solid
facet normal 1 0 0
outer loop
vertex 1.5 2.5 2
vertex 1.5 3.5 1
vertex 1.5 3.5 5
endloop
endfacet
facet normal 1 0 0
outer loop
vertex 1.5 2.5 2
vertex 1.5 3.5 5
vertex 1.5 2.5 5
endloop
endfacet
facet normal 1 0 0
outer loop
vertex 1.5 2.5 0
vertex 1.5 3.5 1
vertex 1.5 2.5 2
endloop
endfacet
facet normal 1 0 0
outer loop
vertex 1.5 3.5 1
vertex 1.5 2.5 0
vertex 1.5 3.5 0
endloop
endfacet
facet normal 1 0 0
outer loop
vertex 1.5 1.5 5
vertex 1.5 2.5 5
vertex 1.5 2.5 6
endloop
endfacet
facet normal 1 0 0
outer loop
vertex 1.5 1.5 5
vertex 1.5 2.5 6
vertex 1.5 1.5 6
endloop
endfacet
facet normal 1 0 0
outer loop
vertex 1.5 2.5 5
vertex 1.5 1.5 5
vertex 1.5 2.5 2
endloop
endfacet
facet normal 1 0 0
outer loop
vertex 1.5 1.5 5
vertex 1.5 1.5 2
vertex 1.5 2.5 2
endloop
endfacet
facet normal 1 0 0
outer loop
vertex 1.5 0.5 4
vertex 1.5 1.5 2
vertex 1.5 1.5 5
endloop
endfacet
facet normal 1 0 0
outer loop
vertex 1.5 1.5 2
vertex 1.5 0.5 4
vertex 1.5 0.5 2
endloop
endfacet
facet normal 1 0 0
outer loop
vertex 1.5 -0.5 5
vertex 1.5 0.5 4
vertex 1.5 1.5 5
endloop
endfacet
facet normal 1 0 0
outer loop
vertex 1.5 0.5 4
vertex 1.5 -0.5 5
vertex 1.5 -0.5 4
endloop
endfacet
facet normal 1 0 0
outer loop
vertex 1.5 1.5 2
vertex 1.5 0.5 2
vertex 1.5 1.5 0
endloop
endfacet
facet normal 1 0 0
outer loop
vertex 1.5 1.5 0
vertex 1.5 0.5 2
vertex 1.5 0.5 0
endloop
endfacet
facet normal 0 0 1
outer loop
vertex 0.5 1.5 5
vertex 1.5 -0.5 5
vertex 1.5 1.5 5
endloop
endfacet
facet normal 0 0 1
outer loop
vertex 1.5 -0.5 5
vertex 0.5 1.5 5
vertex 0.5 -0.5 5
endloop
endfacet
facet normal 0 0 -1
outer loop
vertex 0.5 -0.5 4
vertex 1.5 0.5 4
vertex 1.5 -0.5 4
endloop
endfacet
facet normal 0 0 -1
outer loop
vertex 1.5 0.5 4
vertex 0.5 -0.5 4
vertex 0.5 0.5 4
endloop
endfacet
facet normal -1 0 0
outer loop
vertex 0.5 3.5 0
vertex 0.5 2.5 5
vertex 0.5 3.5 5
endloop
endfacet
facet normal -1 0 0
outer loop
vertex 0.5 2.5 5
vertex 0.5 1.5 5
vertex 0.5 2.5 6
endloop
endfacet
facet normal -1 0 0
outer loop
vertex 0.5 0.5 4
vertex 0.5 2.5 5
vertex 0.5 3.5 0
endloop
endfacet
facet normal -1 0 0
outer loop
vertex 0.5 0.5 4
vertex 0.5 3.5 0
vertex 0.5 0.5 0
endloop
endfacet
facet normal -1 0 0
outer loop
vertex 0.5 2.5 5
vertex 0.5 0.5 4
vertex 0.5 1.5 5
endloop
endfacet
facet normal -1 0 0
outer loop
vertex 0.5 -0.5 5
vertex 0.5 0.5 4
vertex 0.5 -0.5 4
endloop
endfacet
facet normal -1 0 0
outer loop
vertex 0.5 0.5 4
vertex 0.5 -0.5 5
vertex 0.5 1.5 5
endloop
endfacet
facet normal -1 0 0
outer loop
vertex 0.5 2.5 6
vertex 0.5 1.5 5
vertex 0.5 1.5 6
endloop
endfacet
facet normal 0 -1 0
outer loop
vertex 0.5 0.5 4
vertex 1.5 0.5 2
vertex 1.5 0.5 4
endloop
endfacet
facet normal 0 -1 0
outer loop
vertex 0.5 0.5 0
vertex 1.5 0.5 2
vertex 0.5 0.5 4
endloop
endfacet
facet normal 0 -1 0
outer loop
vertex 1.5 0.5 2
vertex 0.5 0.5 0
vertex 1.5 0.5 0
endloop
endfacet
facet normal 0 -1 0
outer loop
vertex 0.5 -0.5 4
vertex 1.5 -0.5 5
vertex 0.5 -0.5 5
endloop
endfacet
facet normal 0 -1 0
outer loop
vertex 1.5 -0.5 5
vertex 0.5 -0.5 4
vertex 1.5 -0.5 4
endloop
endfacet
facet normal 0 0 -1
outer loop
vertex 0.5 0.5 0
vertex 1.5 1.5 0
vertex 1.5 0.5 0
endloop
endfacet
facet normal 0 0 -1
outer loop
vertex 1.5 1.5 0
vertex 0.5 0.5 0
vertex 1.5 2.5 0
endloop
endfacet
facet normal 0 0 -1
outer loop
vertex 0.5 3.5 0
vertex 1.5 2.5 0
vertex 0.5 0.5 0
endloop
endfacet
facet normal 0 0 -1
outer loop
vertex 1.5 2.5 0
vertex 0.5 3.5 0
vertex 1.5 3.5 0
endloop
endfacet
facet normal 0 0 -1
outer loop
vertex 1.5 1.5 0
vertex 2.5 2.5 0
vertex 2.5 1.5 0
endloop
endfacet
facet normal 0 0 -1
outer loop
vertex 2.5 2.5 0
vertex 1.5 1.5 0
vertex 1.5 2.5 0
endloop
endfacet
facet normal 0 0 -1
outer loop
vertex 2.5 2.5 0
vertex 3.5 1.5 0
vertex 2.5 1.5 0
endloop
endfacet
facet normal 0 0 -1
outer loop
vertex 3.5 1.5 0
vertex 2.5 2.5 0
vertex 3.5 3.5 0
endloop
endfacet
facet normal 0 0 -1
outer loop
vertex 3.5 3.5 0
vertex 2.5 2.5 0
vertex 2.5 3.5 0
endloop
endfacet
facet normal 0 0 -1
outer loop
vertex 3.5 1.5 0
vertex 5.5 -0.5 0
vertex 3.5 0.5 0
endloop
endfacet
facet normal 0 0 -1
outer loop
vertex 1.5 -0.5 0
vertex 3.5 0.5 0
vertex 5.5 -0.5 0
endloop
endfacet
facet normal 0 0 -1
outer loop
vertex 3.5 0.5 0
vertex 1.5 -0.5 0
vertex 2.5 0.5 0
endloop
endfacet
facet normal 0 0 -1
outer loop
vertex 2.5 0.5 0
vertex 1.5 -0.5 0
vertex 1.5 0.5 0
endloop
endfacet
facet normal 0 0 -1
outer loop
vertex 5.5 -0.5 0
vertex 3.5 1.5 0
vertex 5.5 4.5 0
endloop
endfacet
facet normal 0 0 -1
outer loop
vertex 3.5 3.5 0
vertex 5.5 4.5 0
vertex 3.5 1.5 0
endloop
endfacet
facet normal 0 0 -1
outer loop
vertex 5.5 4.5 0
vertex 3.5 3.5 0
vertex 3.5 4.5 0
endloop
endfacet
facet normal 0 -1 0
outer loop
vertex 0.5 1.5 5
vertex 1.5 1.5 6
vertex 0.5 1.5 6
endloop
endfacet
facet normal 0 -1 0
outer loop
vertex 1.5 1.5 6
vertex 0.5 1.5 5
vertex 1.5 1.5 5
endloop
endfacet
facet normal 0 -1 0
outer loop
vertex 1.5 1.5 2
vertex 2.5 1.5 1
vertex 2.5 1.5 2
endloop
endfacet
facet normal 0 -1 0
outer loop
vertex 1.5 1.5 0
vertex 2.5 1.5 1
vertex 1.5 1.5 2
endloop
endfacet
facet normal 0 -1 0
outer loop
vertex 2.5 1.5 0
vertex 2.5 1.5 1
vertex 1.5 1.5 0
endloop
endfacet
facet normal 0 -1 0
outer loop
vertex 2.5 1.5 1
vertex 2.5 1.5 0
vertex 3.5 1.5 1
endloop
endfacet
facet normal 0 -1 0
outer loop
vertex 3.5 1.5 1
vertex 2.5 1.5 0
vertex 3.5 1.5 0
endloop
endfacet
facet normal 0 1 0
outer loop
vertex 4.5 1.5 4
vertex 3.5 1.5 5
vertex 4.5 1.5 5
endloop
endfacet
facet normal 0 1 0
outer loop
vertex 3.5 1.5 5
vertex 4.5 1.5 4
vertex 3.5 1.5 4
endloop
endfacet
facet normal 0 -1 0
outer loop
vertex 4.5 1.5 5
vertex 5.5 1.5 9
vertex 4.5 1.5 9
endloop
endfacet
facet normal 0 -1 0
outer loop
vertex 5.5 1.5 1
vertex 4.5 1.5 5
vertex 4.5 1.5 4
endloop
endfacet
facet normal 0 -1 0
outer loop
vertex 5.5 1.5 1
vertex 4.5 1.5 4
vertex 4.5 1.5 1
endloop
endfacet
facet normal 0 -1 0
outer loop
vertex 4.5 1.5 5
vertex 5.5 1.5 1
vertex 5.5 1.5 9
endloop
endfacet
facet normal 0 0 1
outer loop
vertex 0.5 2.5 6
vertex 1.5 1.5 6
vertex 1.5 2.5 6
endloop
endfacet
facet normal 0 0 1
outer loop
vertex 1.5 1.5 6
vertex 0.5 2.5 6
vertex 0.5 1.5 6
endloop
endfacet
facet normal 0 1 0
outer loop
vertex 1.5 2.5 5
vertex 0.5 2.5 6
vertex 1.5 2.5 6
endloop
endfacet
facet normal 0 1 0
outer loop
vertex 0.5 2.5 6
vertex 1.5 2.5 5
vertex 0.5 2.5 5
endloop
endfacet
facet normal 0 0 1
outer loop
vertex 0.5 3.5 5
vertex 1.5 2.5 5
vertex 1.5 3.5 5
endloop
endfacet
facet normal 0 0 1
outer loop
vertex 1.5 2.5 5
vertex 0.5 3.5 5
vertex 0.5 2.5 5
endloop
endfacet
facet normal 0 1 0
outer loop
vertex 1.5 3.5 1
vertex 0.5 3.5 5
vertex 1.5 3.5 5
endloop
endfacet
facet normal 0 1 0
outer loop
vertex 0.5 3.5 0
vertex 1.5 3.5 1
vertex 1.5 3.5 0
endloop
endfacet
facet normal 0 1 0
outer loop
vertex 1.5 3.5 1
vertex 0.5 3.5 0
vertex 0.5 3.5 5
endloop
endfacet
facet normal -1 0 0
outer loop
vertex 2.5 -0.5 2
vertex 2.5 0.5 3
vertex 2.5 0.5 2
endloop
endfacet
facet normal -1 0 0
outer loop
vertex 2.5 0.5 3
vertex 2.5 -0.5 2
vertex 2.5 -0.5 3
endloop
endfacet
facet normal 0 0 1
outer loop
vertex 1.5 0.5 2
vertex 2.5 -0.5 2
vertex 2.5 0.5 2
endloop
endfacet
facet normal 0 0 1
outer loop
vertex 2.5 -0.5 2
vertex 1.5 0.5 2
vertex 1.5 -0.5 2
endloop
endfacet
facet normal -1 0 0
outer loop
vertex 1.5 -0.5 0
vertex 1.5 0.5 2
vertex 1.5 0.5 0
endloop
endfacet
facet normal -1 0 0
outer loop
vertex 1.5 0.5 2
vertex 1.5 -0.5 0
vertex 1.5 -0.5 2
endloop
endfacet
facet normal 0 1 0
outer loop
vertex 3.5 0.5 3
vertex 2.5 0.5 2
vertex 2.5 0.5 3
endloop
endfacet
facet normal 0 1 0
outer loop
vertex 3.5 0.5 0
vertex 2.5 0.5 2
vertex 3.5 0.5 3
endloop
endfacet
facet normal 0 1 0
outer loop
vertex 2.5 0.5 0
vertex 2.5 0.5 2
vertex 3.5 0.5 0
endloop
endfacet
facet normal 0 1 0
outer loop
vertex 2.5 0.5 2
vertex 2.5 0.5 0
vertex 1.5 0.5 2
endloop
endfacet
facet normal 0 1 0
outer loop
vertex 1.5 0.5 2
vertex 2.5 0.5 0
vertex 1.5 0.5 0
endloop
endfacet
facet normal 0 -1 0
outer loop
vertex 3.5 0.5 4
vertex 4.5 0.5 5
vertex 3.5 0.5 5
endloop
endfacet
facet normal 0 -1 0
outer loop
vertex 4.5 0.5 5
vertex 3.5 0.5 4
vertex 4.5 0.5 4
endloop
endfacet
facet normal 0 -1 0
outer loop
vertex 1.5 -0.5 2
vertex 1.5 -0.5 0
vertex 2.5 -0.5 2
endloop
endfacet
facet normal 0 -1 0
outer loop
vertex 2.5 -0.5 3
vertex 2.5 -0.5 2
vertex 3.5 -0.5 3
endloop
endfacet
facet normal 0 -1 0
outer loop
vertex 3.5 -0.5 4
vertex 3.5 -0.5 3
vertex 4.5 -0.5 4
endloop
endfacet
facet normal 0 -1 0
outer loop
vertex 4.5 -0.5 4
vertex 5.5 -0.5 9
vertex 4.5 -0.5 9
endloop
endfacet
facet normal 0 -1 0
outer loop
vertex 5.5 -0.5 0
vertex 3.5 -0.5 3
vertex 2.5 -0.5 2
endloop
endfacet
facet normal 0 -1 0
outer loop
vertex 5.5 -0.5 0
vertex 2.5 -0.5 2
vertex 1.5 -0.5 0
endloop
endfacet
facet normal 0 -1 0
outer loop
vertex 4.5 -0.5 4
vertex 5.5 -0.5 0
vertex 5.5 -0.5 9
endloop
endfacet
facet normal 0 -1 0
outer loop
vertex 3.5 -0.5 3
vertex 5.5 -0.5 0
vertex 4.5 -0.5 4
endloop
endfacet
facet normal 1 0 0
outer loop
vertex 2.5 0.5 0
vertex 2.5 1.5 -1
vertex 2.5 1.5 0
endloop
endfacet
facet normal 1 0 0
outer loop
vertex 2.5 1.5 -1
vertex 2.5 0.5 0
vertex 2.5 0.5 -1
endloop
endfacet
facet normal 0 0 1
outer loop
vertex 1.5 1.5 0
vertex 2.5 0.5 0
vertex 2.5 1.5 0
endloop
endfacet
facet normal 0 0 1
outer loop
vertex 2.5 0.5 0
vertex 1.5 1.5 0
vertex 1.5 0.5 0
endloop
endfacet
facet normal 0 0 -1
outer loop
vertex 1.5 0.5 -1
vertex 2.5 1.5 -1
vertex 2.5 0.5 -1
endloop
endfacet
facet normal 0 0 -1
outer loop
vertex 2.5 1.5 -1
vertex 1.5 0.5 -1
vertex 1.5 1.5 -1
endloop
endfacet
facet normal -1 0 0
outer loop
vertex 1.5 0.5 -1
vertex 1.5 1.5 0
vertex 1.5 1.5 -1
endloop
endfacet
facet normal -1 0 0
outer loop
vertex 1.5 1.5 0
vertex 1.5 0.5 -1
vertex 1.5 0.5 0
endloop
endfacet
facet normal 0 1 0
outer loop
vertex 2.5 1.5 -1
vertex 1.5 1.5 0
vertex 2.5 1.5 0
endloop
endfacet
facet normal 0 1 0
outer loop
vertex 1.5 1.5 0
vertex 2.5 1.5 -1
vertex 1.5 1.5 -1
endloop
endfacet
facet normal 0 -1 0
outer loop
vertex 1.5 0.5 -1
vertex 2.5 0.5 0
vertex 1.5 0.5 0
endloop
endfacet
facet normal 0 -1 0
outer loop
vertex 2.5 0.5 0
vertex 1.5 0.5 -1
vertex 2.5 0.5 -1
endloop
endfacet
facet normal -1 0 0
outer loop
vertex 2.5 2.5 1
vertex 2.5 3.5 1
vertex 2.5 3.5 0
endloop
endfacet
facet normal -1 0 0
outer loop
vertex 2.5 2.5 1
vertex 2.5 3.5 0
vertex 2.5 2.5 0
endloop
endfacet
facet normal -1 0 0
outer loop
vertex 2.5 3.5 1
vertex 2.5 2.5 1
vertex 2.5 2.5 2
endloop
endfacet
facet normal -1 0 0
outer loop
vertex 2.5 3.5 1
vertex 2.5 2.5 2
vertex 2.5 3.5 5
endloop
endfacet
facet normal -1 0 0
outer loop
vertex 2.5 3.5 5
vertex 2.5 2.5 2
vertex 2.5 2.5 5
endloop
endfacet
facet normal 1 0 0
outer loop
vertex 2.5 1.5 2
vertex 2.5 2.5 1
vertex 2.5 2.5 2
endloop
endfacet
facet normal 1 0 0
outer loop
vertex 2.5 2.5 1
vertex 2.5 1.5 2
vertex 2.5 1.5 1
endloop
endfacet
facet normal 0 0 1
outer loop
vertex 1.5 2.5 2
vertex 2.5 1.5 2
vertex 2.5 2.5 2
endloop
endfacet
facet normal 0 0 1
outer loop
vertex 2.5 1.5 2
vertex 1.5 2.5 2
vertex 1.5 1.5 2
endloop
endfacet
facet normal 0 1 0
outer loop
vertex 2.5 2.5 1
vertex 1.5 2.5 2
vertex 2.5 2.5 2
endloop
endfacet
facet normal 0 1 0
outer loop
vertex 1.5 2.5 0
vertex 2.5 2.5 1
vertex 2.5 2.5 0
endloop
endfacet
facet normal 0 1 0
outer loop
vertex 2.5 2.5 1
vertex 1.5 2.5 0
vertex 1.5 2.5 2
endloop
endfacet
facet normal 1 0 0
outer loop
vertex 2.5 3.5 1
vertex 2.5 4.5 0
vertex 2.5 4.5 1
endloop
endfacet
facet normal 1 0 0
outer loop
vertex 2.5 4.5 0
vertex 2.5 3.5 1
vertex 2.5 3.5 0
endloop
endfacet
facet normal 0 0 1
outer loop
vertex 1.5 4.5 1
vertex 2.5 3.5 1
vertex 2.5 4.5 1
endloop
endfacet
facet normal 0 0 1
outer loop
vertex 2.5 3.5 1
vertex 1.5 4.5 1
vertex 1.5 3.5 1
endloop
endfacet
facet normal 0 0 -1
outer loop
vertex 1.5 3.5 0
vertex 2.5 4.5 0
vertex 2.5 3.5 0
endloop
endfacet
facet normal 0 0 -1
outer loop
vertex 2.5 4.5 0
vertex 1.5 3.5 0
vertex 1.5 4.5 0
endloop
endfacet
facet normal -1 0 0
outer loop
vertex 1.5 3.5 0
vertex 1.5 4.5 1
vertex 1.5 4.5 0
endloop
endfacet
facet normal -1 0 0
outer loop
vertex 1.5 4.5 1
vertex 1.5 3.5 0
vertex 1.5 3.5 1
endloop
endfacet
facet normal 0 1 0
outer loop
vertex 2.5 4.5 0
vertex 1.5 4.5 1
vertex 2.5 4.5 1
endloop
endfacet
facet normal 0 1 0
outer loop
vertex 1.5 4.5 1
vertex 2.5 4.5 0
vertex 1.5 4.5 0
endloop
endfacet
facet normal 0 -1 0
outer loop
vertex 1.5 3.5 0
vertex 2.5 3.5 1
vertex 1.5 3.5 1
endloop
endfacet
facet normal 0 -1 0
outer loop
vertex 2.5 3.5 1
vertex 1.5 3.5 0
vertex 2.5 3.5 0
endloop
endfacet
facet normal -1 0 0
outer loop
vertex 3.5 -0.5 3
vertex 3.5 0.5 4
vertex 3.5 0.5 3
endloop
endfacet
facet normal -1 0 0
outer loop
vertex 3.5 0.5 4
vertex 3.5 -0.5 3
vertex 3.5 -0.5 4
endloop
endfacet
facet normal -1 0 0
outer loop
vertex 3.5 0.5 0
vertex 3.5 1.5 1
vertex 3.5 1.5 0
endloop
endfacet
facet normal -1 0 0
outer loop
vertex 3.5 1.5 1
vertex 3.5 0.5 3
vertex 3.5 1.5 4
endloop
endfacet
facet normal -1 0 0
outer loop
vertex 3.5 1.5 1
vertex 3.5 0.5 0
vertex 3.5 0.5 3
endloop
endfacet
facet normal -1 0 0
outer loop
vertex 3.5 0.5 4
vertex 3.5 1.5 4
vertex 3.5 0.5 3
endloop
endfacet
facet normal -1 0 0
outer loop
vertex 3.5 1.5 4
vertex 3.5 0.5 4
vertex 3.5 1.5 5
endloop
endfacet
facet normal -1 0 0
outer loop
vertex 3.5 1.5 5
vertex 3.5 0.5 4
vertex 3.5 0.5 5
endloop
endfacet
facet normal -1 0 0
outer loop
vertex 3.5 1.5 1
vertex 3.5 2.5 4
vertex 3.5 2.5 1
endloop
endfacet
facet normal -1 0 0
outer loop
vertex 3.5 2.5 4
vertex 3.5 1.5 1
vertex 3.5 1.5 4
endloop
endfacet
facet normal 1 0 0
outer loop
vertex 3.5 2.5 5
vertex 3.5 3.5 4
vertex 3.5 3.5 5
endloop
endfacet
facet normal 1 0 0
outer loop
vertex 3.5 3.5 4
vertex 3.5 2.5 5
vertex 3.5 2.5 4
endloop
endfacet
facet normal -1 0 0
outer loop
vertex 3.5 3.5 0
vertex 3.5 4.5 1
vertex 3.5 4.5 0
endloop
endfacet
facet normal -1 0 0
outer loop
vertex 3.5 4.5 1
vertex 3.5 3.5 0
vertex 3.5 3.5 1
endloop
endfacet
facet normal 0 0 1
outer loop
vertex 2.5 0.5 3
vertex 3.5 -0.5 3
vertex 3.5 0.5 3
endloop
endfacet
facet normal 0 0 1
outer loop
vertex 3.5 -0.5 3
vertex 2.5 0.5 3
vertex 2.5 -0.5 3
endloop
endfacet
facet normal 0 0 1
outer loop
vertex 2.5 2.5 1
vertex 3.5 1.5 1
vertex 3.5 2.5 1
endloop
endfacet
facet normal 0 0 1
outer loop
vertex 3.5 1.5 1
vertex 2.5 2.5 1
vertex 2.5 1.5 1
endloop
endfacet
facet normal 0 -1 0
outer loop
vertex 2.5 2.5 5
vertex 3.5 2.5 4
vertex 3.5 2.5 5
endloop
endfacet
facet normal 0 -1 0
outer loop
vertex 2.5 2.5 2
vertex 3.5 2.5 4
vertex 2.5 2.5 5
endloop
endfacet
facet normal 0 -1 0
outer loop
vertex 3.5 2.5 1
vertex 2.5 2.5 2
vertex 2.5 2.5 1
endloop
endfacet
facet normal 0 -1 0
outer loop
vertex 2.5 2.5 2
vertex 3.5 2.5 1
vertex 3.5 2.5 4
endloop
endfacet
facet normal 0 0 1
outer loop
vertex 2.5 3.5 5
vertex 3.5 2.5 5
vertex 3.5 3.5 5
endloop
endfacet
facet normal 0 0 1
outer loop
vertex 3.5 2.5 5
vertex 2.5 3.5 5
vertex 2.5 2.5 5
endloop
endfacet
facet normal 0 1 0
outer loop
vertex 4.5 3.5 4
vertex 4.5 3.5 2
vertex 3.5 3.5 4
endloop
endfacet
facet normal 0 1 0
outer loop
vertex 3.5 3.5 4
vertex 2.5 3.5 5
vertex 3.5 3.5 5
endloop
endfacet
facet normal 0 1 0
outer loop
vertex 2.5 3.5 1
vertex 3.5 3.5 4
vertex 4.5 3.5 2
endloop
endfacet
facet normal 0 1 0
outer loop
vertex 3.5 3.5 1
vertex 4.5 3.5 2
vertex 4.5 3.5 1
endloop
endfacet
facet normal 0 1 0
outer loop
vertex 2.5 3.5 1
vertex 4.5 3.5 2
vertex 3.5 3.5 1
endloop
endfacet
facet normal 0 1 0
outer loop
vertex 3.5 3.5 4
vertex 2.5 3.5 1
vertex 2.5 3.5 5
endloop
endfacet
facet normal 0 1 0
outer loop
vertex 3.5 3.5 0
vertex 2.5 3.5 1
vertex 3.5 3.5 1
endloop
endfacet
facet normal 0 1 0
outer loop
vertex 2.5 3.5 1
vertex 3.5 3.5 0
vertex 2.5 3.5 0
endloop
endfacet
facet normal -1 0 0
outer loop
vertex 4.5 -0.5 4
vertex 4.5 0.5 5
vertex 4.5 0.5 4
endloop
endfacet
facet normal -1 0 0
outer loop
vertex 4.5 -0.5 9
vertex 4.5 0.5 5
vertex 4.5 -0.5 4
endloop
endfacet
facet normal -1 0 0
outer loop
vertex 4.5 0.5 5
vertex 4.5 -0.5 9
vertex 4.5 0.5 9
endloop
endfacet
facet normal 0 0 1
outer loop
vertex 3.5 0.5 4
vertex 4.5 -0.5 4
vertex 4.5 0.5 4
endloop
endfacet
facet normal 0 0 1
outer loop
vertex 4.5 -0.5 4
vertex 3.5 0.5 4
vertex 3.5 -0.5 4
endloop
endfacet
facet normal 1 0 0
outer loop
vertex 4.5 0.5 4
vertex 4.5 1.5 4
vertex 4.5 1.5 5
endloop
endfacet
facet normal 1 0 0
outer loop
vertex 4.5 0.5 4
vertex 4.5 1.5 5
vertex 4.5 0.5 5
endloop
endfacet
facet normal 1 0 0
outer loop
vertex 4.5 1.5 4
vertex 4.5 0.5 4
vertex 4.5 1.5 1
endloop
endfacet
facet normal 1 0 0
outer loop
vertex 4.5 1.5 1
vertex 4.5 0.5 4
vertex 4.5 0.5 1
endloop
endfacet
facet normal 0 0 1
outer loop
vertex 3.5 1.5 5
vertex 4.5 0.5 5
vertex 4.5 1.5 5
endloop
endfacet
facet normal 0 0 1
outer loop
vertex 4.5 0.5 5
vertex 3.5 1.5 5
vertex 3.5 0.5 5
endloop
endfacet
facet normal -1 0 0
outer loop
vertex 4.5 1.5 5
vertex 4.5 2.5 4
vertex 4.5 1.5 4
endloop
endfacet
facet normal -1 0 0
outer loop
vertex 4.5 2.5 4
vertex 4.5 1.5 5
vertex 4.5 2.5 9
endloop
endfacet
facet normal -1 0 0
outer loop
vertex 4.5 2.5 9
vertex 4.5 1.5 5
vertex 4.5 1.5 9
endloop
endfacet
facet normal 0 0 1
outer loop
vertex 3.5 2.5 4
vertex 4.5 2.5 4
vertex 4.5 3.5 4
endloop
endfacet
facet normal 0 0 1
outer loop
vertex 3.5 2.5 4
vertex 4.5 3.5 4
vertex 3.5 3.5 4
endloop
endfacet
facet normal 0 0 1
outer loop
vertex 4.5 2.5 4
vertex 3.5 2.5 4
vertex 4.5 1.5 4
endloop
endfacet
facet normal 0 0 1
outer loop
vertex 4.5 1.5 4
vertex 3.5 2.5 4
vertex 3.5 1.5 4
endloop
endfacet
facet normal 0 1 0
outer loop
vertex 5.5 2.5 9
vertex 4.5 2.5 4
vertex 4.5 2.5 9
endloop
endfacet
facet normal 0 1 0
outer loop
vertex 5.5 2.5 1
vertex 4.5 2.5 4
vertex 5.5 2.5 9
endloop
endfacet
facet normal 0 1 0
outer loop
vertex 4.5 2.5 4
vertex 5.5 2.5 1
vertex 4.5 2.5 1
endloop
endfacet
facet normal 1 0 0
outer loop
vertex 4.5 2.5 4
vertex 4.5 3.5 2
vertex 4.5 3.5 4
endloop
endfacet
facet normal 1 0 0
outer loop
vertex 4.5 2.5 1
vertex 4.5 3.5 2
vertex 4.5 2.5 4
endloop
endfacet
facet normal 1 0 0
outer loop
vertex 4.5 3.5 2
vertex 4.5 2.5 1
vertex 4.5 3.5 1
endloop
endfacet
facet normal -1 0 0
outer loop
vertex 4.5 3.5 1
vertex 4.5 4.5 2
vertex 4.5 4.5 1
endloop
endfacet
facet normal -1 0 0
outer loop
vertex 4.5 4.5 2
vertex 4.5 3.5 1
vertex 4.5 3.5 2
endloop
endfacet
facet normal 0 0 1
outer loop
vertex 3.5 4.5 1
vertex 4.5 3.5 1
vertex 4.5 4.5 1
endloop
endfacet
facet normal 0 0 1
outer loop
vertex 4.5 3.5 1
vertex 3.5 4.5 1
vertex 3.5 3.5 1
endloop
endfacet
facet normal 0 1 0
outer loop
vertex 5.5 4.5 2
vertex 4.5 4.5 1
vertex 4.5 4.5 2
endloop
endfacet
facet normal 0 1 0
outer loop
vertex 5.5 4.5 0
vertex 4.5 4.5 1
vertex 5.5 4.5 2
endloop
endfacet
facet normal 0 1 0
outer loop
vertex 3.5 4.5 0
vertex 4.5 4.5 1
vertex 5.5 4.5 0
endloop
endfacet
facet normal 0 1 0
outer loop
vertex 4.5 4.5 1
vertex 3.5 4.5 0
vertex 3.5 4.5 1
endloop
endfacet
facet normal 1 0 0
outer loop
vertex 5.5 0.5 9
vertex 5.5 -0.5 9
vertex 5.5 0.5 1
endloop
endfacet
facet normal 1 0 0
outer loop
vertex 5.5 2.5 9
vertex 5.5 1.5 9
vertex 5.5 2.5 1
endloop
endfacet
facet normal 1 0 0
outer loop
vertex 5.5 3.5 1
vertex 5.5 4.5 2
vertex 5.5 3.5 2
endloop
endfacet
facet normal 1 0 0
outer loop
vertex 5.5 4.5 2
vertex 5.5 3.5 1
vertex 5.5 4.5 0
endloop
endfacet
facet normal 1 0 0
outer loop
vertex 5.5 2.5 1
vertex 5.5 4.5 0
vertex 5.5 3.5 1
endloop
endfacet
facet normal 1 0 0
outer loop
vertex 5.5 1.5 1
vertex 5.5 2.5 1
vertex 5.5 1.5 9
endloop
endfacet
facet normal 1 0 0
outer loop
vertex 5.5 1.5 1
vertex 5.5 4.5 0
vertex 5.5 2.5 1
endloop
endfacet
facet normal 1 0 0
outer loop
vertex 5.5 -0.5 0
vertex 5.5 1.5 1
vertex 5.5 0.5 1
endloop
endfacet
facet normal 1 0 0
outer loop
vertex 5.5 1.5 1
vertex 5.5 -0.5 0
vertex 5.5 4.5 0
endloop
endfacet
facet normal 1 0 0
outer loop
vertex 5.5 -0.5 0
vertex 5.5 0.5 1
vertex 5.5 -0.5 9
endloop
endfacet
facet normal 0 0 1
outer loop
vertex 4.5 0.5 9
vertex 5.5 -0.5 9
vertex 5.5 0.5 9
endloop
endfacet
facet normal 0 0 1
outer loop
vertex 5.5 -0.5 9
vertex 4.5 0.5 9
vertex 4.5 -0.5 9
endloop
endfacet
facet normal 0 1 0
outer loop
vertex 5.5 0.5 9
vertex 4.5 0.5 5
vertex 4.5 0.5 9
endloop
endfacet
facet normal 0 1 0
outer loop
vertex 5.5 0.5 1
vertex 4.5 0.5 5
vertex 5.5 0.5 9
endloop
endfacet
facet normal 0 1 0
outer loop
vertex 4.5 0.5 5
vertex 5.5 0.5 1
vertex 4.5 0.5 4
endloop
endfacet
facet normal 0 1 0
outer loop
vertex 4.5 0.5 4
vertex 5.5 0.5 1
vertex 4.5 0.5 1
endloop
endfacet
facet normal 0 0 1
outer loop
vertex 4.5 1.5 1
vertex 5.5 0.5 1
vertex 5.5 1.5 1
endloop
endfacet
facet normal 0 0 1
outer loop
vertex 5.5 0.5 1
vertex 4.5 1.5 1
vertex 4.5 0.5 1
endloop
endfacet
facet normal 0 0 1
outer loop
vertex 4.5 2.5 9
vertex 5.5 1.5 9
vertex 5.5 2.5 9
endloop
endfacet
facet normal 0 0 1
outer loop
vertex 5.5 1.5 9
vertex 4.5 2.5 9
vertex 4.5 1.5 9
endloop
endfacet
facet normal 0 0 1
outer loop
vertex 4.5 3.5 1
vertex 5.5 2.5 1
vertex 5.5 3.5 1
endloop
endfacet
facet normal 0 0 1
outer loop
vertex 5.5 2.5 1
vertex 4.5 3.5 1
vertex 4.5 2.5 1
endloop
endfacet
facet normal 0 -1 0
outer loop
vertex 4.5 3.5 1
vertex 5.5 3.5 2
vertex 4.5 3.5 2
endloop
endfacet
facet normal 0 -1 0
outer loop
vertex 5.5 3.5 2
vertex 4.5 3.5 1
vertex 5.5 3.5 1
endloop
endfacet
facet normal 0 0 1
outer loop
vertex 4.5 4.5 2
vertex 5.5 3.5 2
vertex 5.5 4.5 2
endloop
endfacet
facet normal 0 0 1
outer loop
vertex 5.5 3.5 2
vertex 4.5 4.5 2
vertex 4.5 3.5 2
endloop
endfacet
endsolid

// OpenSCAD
union() {
    translate([1, 0, 4.5]) color([1, 0, 0]) cube([1, 1, 1], center=true);
    translate([1, 1, 2.5]) cube([1, 1, 5], center=true);
    translate([1, 2, 3.0]) cube([1, 1, 6], center=true);
    translate([1, 3, 2.5]) cube([1, 1, 5], center=true);
    translate([2, 0, 1.0]) cube([1, 1, 2], center=true);
    translate([2, 1, -0.5]) color([0, 0, 1]) cube([1, 1, 1], center=true);
    translate([2, 2, 1.0]) cube([1, 1, 2], center=true);
    translate([2, 4, 0.5]) cube([1, 1, 1], center=true);
    translate([3, 0, 1.5]) cube([1, 1, 3], center=true);
    translate([3, 2, 0.5]) cube([1, 1, 1], center=true);
    translate([3, 3, 2.5]) cube([1, 1, 5], center=true);
    translate([4, 0, 2.0]) cube([1, 1, 4], center=true);
    translate([4, 1, 2.5]) cube([1, 1, 5], center=true);
    translate([4, 2, 2.0]) cube([1, 1, 4], center=true);
    translate([4, 3, 2.0]) cube([1, 1, 4], center=true);
    translate([4, 4, 0.5]) cube([1, 1, 1], center=true);
    translate([5, 0, 4.5]) cube([1, 1, 9], center=true);
    translate([5, 1, 0.5]) cube([1, 1, 1], center=true);
    translate([5, 2, 4.5]) cube([1, 1, 9], center=true);
    translate([5, 3, 0.5]) cube([1, 1, 1], center=true);
    translate([5, 4, 1.0]) cube([1, 1, 2], center=true);
}
